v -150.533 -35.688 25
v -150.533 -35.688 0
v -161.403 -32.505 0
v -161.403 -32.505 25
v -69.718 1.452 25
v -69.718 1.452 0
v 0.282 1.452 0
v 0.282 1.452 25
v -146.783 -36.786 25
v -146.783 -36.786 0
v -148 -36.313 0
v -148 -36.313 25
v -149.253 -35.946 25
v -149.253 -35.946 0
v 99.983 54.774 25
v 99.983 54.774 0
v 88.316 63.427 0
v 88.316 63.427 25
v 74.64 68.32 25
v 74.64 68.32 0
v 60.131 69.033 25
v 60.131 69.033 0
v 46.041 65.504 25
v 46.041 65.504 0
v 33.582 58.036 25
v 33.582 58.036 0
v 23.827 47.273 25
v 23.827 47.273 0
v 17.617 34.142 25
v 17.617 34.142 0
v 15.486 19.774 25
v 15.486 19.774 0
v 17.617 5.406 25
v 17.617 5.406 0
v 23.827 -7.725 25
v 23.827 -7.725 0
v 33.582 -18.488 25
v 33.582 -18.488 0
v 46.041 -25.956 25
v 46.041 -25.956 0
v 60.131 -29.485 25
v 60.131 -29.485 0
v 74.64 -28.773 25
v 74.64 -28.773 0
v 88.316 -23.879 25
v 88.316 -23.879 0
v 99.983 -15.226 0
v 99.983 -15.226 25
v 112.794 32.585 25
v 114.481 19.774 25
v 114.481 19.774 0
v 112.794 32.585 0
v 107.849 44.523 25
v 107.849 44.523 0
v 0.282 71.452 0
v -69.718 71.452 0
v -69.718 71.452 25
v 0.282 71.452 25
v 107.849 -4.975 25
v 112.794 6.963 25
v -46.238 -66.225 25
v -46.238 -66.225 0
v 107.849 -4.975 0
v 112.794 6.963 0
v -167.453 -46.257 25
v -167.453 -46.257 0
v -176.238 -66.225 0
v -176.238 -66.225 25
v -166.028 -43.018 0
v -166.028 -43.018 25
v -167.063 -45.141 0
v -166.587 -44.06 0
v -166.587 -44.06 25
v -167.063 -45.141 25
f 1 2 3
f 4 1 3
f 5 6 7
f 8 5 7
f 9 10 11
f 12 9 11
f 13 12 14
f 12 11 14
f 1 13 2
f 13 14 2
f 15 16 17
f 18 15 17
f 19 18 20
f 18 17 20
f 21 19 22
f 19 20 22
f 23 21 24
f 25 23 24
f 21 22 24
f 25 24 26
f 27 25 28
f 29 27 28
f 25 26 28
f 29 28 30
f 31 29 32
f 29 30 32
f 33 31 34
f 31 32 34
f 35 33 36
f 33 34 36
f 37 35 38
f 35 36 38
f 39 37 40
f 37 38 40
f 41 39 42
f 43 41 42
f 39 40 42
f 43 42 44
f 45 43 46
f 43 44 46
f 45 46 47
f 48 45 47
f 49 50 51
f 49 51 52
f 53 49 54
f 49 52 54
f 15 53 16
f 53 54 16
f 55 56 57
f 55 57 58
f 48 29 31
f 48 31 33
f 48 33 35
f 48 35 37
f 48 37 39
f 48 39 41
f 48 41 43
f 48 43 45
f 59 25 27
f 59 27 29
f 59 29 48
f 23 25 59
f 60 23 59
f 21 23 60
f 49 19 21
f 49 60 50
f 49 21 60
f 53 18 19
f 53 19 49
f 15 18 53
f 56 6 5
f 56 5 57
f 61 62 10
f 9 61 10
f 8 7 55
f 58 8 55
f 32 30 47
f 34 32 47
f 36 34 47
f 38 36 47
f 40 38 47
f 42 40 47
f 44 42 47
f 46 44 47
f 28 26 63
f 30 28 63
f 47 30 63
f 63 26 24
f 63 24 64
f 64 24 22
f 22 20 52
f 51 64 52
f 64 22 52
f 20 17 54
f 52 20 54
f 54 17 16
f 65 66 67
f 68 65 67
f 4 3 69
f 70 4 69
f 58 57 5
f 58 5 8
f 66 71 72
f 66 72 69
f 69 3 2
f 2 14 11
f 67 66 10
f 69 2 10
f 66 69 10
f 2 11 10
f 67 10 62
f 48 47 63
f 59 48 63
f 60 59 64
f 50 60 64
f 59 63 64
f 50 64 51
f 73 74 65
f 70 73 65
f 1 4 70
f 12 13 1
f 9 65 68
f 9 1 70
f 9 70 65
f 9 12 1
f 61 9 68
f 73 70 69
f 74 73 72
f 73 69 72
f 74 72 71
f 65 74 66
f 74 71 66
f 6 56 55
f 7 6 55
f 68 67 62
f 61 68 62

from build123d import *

# Parameters (mm, degrees)
F0_W     = 70
F0_H     = 70
F0_R     = 34.6665784116
F1_DEPTH = 25


with BuildPart() as f1:
    # F0 (on Top) → F1 (new body)
    with BuildSketch(Plane.XY):
        with Locations((-34.7177423537, 36.4523915446)):
            Rectangle(F0_W, F0_H)
        with Locations((-34.7177423537, 36.4523915446)):
            Circle(F0_R, mode=Mode.SUBTRACT)
        with Locations((-34.7177423537, 36.4523915446)):
            Circle(F0_R)
    extrude(amount=F1_DEPTH)


with BuildPart() as f1b:
    # F0 (on Top) → F1, piece 2 (new body)
    with BuildSketch(Plane.XY):
        with BuildLine():
            ThreePointArc((99.9830362201, 54.7738714889), (64.9830362201, 69.2713461719), (29.9830362201, 54.7738714889))
            Line((29.9830362201, 54.7738714889), (99.9830362201, 54.7738714889))
        make_face()
        with Locations((64.9830362201, 19.7738714889)):
            Rectangle(F0_W, F0_H)
        with BuildLine():
            Line((29.9830362201, -15.2261285111), (29.9830362201, 54.7738714889))
            ThreePointArc((29.9830362201, 54.7738714889), (15.485561537, 19.7738714889), (29.9830362201, -15.2261285111))
        make_face()
        with BuildLine():
            ThreePointArc((114.4805109031, 19.7738714889), (110.7127399907, 38.715734994), (99.9830362201, 54.7738714889))
            Line((99.9830362201, 54.7738714889), (99.9830362201, -15.2261285111))
            ThreePointArc((99.9830362201, -15.2261285111), (110.7127399907, 0.8320079838), (114.4805109031, 19.7738714889))
        make_face()
        with BuildLine():
            Line((99.9830362201, -15.2261285111), (29.9830362201, -15.2261285111))
            ThreePointArc((29.9830362201, -15.2261285111), (64.9830362201, -29.7236031942), (99.9830362201, -15.2261285111))
        make_face()
    extrude(amount=F1_DEPTH)


with BuildPart() as f1c:
    # F0 (on Top) → F1, piece 3 (new body)
    with BuildSketch(Plane.XY):
        with BuildLine():
            Line((-167.4532014709, -46.2568461603), (-176.2380748987, -66.2246495485))
            Line((-176.2380748987, -66.2246495485), (-46.2380748987, -66.2246495485))
            Line((-46.2380748987, -66.2246495485), (-146.7831098452, -36.7860326256))
            ThreePointArc((-146.7831098452, -36.7860326256), (-140.1550537688, -42.4009590309), (-137.6767319393, -50.7266089635))
            ThreePointArc((-137.6767319393, -50.7266089635), (-155.1603666553, -65.7816489608), (-167.4532014709, -46.2568461603))
        make_face()
        with BuildLine():
            ThreePointArc((-166.0283570259, -43.0182094321), (-166.8351873466, -44.5959927722), (-167.4532014709, -46.2568461603))
            Line((-167.4532014709, -46.2568461603), (-166.0283570259, -43.0182094321))
        make_face()
        with BuildLine():
            Line((-166.0283570259, -43.0182094321), (-167.4532014709, -46.2568461603))
            ThreePointArc((-167.4532014709, -46.2568461603), (-155.1603666553, -65.7816489608), (-137.6767319393, -50.7266089635))
            ThreePointArc((-137.6767319393, -50.7266089635), (-140.1550537688, -42.4009590309), (-146.7831098452, -36.7860326256))
            Line((-146.7831098452, -36.7860326256), (-150.5329868093, -35.6881048013))
            ThreePointArc((-150.5329868093, -35.6881048013), (-159.4103952668, -36.9649945434), (-166.0283570259, -43.0182094321))
        make_face()
        with BuildLine():
            Line((-150.5329868093, -35.6881048013), (-146.7831098452, -36.7860326256))
            ThreePointArc((-146.7831098452, -36.7860326256), (-148.6226779618, -36.1162643074), (-150.5329868093, -35.6881048013))
        make_face()
        with BuildLine():
            Line((-161.403227687, -32.5054030675), (-166.0283570259, -43.0182094321))
            ThreePointArc((-166.0283570259, -43.0182094321), (-159.4103952668, -36.9649945434), (-150.5329868093, -35.6881048013))
            Line((-150.5329868093, -35.6881048013), (-161.403227687, -32.5054030675))
        make_face()
    extrude(amount=F1_DEPTH)


solid = Compound([f1.part, f1b.part, f1c.part])
